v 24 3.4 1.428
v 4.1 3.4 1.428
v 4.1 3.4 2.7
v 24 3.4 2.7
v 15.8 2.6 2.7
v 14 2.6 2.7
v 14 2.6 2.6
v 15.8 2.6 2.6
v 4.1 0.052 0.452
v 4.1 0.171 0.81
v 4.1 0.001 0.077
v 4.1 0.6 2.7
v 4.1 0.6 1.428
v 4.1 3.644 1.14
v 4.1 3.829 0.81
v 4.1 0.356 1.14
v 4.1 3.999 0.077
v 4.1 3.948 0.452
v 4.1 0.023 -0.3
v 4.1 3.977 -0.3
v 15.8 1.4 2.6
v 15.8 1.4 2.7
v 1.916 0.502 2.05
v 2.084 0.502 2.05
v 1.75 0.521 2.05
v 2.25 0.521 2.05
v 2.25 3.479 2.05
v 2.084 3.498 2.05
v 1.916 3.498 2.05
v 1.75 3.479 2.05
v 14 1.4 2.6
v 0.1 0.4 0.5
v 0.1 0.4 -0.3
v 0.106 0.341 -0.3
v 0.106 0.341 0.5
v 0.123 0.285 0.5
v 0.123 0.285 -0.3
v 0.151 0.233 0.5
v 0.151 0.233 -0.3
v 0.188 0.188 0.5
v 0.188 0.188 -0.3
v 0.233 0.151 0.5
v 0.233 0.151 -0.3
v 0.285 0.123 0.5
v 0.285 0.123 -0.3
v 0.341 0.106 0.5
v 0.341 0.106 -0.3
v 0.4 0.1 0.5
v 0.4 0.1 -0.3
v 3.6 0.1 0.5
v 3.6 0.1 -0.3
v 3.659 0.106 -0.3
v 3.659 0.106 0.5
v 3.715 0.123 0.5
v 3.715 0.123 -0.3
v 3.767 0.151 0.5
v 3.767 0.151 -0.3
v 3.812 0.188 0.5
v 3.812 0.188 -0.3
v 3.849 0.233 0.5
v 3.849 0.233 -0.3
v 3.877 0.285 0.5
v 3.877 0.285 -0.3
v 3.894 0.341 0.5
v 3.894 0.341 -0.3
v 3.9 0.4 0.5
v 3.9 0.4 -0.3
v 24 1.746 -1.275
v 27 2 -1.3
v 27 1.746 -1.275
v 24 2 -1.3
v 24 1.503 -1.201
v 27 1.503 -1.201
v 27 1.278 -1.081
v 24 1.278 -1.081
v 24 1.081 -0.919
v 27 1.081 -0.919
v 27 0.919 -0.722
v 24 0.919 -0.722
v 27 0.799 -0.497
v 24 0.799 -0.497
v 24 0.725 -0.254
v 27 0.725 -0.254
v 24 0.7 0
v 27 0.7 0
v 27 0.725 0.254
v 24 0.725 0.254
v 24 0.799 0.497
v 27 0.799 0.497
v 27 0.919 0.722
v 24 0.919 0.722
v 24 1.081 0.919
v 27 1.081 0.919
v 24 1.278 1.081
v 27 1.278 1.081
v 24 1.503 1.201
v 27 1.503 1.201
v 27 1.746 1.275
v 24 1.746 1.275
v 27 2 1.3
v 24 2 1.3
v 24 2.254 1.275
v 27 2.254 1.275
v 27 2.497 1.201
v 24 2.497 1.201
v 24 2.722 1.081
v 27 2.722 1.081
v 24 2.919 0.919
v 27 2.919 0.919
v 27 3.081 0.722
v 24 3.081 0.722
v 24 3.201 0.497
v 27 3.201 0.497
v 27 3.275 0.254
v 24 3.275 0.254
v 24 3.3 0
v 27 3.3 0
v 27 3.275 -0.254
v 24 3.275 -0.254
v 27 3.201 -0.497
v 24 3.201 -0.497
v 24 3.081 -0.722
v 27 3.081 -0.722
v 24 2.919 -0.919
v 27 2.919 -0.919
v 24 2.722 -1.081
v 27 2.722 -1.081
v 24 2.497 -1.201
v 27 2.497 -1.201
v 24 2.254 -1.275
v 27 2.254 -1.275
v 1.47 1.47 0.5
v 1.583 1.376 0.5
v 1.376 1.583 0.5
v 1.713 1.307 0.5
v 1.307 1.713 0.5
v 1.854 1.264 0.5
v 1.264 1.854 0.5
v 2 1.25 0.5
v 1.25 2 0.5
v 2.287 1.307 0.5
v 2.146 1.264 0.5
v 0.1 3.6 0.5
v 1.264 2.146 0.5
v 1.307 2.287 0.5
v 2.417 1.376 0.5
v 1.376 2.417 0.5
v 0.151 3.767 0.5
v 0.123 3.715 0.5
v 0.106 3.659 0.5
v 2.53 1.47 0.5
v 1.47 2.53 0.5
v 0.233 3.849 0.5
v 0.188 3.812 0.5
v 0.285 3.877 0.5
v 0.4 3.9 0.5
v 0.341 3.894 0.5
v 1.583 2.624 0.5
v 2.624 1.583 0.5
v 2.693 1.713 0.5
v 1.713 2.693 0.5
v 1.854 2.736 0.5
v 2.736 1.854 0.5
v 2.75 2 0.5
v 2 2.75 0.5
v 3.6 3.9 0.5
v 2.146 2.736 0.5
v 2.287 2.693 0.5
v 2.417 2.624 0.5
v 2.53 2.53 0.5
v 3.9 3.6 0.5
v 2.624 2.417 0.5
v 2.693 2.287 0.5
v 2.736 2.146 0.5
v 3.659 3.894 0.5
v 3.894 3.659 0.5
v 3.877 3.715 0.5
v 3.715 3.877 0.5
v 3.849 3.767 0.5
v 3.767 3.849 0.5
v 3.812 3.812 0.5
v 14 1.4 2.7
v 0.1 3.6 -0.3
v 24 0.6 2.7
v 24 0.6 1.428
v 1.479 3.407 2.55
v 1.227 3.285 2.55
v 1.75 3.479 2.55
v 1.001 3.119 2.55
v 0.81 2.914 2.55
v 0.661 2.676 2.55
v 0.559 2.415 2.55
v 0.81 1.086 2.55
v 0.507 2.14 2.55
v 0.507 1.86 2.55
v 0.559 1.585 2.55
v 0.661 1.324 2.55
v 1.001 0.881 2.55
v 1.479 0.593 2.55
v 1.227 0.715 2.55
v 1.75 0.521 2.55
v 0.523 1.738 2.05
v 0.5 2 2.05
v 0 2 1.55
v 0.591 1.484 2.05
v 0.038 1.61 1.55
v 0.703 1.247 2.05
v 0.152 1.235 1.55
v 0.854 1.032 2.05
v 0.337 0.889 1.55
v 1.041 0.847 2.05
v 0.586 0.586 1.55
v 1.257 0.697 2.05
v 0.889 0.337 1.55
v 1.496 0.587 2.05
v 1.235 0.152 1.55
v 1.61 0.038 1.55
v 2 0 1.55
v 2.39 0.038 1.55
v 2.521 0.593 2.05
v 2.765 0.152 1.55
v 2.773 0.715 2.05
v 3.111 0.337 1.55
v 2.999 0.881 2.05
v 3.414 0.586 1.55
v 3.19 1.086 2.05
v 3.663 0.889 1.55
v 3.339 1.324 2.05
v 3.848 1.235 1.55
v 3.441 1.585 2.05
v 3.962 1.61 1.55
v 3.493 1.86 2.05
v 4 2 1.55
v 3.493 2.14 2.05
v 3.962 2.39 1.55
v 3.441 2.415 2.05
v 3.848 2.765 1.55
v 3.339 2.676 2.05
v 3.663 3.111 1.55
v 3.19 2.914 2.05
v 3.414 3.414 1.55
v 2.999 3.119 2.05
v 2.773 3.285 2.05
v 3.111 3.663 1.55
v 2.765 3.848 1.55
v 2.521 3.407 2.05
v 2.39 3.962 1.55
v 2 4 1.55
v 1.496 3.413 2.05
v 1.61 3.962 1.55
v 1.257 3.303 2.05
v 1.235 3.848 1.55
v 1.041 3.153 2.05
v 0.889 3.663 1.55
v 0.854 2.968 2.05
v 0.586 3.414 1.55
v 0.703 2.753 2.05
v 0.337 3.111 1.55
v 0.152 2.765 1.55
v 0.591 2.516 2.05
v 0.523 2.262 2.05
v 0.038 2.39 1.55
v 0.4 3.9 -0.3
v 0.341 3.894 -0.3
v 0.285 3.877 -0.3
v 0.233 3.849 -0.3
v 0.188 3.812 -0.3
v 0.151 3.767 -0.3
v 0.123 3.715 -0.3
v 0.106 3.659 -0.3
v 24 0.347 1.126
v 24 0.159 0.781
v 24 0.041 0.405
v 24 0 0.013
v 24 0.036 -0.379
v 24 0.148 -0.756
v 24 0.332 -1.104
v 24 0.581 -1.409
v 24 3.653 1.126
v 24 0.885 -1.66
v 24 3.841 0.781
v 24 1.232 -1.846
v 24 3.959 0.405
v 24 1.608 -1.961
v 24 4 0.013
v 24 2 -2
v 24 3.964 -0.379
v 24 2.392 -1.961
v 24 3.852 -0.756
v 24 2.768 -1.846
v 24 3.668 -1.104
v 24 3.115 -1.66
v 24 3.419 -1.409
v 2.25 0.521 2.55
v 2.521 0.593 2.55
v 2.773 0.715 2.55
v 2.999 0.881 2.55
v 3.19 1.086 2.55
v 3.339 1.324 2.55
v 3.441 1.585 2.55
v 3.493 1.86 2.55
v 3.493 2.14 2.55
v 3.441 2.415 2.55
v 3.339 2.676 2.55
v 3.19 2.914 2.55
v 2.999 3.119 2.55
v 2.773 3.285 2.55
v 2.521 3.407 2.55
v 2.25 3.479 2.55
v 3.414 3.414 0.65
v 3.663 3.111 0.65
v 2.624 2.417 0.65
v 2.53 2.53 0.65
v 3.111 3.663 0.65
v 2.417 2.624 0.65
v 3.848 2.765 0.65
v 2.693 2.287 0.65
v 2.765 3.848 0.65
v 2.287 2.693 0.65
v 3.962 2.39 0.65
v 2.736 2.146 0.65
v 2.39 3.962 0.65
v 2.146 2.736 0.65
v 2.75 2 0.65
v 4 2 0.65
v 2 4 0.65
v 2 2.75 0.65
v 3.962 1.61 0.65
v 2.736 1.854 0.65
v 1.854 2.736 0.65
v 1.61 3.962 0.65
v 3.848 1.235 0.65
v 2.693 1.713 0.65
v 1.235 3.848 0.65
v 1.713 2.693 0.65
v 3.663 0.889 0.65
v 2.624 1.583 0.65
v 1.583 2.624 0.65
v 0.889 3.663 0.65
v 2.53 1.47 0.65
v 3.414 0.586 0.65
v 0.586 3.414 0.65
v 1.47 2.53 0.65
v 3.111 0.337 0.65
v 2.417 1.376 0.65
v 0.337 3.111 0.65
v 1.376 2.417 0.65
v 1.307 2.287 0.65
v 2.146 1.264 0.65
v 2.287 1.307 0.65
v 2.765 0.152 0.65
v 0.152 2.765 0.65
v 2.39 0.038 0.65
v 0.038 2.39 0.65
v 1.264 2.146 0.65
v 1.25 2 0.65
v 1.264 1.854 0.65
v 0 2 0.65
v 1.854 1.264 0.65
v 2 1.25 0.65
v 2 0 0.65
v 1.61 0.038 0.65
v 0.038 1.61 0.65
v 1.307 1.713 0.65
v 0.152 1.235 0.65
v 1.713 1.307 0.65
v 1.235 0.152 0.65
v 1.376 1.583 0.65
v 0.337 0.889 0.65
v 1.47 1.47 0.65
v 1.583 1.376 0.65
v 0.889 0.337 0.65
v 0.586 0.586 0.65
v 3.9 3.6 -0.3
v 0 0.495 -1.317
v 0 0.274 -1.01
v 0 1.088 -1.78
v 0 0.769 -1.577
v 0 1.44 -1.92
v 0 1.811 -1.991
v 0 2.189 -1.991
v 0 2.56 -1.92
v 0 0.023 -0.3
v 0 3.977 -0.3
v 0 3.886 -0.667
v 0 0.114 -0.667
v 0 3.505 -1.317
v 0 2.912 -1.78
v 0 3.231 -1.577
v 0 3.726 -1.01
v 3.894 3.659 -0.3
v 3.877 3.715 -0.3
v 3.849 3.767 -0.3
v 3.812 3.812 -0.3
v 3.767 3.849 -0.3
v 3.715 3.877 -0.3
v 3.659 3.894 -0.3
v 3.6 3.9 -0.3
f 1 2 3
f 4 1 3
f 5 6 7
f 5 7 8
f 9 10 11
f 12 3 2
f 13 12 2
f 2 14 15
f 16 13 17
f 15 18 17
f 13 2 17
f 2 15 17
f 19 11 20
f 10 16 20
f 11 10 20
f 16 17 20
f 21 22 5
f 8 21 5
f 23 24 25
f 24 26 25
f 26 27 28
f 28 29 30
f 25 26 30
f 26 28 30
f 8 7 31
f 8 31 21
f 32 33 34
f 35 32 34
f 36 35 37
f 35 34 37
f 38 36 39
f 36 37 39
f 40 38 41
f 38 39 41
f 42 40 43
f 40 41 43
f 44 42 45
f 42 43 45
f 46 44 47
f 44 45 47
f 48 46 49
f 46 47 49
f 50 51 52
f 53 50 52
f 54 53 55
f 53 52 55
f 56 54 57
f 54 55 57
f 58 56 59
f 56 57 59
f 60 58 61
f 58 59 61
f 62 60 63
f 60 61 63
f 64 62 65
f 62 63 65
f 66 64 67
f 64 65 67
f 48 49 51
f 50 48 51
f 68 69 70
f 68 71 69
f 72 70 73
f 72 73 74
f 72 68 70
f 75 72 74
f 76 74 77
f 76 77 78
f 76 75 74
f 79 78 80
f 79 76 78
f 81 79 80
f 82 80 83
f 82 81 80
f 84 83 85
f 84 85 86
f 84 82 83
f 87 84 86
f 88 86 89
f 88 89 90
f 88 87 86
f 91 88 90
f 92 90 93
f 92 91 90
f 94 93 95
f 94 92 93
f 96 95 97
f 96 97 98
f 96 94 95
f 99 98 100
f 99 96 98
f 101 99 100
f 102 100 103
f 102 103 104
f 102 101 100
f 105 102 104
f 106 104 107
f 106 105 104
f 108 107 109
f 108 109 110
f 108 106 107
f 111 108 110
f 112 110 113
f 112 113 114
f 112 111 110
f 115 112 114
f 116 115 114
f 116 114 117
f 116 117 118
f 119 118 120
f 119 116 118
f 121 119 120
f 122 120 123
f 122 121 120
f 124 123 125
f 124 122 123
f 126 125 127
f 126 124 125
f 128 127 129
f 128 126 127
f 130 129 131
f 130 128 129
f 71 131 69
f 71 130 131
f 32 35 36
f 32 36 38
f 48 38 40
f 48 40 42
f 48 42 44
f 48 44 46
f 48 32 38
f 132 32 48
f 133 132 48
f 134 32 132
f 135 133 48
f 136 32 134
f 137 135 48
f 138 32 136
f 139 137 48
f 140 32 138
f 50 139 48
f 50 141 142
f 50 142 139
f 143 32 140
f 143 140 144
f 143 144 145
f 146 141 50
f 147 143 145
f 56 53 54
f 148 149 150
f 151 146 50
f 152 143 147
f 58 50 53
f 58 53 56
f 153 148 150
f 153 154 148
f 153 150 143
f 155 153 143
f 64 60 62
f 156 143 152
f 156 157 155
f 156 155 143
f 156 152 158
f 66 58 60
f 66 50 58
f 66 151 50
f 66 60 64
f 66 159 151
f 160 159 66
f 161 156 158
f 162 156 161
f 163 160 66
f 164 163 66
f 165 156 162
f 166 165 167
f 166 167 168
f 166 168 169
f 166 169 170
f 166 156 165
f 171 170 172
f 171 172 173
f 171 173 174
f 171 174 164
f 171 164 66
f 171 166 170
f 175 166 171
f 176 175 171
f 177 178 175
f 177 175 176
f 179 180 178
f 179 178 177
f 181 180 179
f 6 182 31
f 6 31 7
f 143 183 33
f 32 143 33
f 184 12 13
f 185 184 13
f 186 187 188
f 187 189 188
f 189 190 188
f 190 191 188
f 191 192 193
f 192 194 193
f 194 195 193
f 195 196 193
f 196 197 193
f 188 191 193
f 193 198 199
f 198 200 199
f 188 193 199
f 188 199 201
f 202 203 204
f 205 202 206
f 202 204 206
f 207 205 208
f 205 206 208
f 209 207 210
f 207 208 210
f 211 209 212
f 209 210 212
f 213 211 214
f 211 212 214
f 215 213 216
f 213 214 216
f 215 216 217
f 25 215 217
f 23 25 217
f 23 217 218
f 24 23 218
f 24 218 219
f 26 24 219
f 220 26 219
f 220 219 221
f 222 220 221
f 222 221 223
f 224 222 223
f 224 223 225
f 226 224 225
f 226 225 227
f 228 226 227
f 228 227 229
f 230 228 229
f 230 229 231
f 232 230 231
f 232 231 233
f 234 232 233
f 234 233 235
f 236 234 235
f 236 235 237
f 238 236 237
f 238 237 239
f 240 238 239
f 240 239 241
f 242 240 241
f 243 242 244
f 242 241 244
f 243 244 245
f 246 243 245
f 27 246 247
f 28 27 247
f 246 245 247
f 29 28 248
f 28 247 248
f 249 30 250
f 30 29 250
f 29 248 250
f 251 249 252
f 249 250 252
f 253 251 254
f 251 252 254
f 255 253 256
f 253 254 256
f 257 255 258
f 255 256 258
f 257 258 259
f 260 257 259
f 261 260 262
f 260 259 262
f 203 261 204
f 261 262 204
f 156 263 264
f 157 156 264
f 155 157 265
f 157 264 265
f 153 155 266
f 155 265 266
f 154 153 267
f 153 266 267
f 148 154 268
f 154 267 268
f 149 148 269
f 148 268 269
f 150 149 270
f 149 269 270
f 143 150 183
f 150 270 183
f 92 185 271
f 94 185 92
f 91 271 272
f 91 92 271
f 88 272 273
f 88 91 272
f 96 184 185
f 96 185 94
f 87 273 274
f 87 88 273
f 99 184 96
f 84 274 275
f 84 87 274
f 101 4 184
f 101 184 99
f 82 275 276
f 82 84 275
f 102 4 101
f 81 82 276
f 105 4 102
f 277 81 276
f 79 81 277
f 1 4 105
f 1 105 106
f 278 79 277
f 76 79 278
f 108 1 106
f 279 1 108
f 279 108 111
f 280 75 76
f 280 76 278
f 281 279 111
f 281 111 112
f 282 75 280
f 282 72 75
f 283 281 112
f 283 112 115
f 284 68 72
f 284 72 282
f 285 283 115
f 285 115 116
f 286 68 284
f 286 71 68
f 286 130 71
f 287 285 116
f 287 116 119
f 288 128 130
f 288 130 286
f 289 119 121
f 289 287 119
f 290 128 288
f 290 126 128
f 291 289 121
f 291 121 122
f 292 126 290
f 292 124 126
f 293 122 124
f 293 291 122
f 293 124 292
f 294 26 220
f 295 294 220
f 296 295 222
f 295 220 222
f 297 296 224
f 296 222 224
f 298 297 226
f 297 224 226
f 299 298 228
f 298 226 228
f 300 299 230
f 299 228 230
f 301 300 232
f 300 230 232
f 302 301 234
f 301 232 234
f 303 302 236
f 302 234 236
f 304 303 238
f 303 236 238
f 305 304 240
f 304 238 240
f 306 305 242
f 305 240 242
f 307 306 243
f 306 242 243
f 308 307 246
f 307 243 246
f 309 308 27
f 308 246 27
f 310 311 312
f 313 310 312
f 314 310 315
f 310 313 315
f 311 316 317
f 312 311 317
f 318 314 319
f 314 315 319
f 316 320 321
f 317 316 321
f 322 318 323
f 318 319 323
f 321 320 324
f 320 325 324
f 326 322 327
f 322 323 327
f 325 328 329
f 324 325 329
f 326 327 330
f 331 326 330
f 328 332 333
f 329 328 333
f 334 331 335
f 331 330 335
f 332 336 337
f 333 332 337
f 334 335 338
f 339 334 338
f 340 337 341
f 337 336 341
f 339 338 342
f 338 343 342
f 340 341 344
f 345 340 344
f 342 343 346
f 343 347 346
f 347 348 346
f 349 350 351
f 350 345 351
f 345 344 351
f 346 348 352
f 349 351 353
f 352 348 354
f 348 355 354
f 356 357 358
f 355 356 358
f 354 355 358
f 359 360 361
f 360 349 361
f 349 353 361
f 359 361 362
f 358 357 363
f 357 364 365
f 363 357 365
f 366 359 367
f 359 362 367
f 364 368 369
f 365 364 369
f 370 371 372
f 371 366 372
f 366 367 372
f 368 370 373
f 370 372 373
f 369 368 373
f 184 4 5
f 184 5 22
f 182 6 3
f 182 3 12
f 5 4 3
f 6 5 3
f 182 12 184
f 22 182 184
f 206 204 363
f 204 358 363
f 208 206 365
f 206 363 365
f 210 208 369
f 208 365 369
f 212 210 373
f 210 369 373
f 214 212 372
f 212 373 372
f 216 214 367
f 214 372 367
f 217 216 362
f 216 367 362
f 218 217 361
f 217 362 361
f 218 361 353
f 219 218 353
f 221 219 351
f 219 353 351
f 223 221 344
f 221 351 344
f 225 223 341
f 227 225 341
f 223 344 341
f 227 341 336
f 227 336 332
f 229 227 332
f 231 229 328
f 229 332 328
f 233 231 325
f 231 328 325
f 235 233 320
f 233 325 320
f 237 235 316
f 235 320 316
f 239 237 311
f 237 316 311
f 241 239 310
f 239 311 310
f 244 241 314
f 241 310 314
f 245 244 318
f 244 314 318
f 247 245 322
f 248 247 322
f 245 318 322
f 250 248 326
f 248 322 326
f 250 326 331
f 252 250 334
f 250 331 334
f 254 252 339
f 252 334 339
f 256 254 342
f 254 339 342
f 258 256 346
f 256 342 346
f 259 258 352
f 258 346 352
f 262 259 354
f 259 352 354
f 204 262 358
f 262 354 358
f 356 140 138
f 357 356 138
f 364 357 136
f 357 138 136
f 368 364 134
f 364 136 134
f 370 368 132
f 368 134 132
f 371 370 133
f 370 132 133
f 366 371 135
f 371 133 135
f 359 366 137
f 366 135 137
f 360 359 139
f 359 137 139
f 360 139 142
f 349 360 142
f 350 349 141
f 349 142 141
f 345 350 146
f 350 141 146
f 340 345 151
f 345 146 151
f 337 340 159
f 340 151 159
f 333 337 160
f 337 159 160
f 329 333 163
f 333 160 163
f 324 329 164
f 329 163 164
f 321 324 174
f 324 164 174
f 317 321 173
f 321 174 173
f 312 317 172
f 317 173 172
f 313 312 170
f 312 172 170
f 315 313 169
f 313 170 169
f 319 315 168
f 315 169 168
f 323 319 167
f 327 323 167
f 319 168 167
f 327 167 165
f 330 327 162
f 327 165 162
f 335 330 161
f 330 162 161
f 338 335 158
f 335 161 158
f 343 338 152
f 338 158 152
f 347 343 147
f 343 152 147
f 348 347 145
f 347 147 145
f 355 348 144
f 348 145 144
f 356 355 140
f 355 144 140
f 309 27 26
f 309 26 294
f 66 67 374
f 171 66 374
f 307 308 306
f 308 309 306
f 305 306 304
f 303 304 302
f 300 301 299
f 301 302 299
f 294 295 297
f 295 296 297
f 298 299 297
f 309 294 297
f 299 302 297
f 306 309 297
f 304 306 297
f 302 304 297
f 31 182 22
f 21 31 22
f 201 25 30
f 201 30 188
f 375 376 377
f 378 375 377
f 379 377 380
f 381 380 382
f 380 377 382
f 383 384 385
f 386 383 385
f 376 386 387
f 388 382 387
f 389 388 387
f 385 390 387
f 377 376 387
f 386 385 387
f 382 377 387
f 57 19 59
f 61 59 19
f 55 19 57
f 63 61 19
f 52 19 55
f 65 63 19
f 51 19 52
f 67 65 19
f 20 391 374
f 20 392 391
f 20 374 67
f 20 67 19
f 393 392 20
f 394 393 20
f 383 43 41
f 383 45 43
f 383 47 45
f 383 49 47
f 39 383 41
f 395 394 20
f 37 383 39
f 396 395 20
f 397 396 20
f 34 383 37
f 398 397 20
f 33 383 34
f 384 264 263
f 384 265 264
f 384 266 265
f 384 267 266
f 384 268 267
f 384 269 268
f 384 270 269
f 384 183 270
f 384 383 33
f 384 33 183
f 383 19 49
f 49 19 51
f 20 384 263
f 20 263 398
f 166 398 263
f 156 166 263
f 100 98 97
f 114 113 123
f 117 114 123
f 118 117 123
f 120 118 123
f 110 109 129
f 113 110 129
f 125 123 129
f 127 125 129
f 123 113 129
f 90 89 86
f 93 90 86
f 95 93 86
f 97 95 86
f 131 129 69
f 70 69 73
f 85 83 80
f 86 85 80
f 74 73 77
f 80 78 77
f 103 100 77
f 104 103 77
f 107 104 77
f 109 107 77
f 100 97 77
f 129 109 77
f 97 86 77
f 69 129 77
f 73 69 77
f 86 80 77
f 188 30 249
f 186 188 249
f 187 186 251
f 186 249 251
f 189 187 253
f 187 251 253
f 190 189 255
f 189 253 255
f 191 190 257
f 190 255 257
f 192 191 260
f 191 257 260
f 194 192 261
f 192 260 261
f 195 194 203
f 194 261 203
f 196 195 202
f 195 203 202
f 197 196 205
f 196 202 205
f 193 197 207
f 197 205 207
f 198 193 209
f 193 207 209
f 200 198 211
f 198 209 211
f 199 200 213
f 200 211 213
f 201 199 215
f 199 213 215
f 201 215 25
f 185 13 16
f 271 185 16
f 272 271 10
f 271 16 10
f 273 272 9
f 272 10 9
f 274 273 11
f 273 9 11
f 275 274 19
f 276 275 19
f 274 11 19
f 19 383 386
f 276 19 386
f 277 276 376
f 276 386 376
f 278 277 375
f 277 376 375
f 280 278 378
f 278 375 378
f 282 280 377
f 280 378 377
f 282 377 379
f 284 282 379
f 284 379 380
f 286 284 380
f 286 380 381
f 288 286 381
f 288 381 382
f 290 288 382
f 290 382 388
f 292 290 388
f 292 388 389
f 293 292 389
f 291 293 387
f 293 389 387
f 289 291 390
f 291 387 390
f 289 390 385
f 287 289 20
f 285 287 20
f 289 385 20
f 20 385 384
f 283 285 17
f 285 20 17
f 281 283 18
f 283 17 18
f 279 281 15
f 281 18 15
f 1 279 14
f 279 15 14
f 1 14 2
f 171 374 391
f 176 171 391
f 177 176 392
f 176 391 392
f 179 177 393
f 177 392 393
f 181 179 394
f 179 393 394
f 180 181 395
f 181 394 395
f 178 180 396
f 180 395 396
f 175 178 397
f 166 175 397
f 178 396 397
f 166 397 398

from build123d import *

# Parameters (mm, degrees)
BOSS_EXTRUDE1_DEPTH     = 24
SKETCH2_W               = 3
SKETCH2_H               = 4
CUT_EXTRUDE1_DEPTH      = 4.1
BOSS_EXTRUDE2_DEPTH     = 0.8
SKETCH5_W               = 0.5
SKETCH5_H               = 0.5
CUT_EXTRUDE2_DEPTH      = 2
CUT_EXTRUDE2_DEPTH_BACK = 2
SKETCH6_W               = 1.8
SKETCH6_H               = 1.2
CUT_EXTRUDE3_DEPTH      = 0.1
SKETCH7_W               = 3
SKETCH7_H               = 1.3


with BuildPart() as part:
    # Sketch1 → Boss-Extrude1 (new body)
    with BuildSketch(Plane(origin=(0, 0, 0), x_dir=(0, 0, -1), z_dir=(1, 0, 0))):
        with BuildLine():
            Line((-2.7, 0.6), (-1.428285686, 0.6))
            ThreePointArc((-1.428285686, 0.6), (2, 2), (-1.428285686, 3.4))
            Line((-1.428285686, 3.4), (-2.7, 3.4))
            Line((-2.7, 3.4), (-2.7, 0.6))
        make_face()
    extrude(amount=BOSS_EXTRUDE1_DEPTH)

    # Sketch2 → Cut-Extrude1 (cut)
    with BuildSketch(Plane(origin=(0, 0, 0), x_dir=(0, 0, -1), z_dir=(1, 0, 0))):
        with Locations((-1.2, 2)):
            Rectangle(SKETCH2_W, SKETCH2_H)
    extrude(amount=CUT_EXTRUDE1_DEPTH, mode=Mode.SUBTRACT)

    # Sketch3 → Boss-Extrude2 (add)
    with BuildSketch(Plane.XY.offset(-0.3)):
        with BuildLine():
            Line((0.4, 0.1), (3.6, 0.1))
            ThreePointArc((3.6, 0.1), (3.812132034, 0.187867966), (3.9, 0.4))
            Line((3.9, 0.4), (3.9, 3.6))
            ThreePointArc((3.9, 3.6), (3.812132034, 3.812132034), (3.6, 3.9))
            Line((3.6, 3.9), (0.4, 3.9))
            ThreePointArc((0.4, 3.9), (0.187867966, 3.812132034), (0.1, 3.6))
            Line((0.1, 3.6), (0.1, 0.4))
            ThreePointArc((0.1, 0.4), (0.187867966, 0.187867966), (0.4, 0.1))
        make_face()
    extrude(amount=BOSS_EXTRUDE2_DEPTH)

    # Sketch4 → Revolve1 (revolve)
    with BuildSketch(Plane(origin=(0, 2, 0), x_dir=(-1, 0, 0), z_dir=(0, 1, 0))):
        Polygon((-2, 2.55), (-0.5, 2.55), (-0.5, 2.05), (0, 1.55), (0, 0.65), (-1.25, 0.65), (-1.25, 0.3), (-2, 0.3), align=None)
    revolve(axis=Axis((2, 2, 0.3), (0, 0, 1)))

    # Sketch5 → Cut-Extrude2 (cut, two sides)
    with BuildSketch(Plane(origin=(0, 2, 0), x_dir=(-1, 0, 0), z_dir=(0, 1, 0))) as cut_extrude2_sk:
        with Locations((-2, 2.3)):
            Rectangle(SKETCH5_W, SKETCH5_H)
    extrude(amount=CUT_EXTRUDE2_DEPTH, mode=Mode.SUBTRACT)
    extrude(cut_extrude2_sk.sketch, amount=-CUT_EXTRUDE2_DEPTH_BACK, mode=Mode.SUBTRACT)

    # Sketch6 → Cut-Extrude3 (cut)
    with BuildSketch(Plane.XY.offset(2.7)):
        with Locations((14.9, 2)):
            Rectangle(SKETCH6_W, SKETCH6_H)
    extrude(amount=-CUT_EXTRUDE3_DEPTH, mode=Mode.SUBTRACT)

    # Sketch7 → Revolve2 (revolve)
    with BuildSketch(Plane(origin=(0, 2, 0), x_dir=(-1, 0, 0), z_dir=(0, 1, 0))):
        with Locations((-25.5, -0.65)):
            Rectangle(SKETCH7_W, SKETCH7_H)
    revolve(axis=Axis((27, 2, 0), (-1, 0, 0)))


solid = part.part
